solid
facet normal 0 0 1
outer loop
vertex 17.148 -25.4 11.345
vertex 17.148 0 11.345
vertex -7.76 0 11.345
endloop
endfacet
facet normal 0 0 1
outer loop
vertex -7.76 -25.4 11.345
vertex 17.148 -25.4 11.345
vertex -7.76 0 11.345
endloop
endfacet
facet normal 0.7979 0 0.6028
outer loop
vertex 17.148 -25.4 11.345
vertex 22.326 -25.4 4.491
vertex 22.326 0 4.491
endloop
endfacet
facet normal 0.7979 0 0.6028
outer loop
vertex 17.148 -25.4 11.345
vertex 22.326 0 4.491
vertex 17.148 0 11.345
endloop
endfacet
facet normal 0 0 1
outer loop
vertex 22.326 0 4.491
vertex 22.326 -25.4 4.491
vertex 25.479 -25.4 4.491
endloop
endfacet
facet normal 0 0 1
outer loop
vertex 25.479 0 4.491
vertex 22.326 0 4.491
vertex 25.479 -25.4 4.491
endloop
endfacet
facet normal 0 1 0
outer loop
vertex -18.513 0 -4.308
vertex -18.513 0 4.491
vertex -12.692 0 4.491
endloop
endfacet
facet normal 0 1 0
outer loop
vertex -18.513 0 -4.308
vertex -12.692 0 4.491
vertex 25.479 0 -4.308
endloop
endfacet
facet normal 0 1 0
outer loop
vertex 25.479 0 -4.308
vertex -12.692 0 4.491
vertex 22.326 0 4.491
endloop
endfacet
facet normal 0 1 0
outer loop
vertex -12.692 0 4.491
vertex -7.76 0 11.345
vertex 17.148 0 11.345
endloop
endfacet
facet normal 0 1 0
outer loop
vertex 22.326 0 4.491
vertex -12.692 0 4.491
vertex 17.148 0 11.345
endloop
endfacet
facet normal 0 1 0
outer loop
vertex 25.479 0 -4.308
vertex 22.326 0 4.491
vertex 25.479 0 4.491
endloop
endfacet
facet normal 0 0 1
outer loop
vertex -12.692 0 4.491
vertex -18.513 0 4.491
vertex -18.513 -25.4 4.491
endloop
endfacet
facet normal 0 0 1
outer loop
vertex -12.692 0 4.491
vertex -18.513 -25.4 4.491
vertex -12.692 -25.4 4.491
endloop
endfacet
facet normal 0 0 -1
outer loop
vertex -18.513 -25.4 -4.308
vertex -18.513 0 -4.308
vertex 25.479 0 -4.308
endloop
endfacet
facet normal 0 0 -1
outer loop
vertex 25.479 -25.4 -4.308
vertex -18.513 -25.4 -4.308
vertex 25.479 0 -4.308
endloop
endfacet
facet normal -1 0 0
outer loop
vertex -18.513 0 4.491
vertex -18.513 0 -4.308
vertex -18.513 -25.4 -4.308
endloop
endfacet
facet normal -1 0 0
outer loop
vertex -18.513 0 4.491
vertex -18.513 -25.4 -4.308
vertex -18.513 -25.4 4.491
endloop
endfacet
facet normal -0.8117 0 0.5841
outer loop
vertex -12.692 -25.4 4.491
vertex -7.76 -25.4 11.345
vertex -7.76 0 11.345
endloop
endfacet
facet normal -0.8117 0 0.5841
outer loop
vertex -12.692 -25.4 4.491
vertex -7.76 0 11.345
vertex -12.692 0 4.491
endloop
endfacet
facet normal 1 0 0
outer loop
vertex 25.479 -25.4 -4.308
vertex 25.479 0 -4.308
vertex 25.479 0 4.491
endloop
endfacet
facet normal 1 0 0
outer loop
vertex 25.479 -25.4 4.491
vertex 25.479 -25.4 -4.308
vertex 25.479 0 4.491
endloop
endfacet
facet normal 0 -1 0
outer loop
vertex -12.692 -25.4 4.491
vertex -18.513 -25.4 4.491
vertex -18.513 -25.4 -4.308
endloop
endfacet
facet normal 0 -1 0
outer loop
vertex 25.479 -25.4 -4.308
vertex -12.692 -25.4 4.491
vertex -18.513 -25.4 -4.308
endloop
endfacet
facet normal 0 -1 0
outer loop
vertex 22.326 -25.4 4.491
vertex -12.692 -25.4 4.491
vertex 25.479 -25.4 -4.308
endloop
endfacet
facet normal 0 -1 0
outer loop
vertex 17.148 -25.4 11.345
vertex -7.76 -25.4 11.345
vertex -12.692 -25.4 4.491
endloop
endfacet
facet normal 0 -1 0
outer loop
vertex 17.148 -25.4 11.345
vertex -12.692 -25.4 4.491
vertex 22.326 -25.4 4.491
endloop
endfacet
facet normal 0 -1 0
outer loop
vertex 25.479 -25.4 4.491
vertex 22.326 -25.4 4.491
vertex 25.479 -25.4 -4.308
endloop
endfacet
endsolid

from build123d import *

# Parameters (mm, degrees)
F0_W     = 43.9917519689
F0_H     = 8.7983510457
F1_DEPTH = 25.4
F3_DEPTH = 25.4


with BuildPart() as f1:
    # F0 (on Front) → F1 (new body)
    with BuildSketch(Plane.XZ):
        with Locations((3.4826807678, 0.0916493591)):
            Rectangle(F0_W, F0_H)
    extrude(amount=F1_DEPTH)

    # F2 (on face) → F3 (join)
    with BuildSketch(Plane.XZ.offset(25.4)):
        Polygon((-7.7598788776, 11.3449869677), (-12.6920454204, 4.4908248819), (22.3263110965, 4.4908248819), (17.1475466341, 11.3449869677), align=None)
    extrude(amount=-F3_DEPTH)


solid = f1.part
